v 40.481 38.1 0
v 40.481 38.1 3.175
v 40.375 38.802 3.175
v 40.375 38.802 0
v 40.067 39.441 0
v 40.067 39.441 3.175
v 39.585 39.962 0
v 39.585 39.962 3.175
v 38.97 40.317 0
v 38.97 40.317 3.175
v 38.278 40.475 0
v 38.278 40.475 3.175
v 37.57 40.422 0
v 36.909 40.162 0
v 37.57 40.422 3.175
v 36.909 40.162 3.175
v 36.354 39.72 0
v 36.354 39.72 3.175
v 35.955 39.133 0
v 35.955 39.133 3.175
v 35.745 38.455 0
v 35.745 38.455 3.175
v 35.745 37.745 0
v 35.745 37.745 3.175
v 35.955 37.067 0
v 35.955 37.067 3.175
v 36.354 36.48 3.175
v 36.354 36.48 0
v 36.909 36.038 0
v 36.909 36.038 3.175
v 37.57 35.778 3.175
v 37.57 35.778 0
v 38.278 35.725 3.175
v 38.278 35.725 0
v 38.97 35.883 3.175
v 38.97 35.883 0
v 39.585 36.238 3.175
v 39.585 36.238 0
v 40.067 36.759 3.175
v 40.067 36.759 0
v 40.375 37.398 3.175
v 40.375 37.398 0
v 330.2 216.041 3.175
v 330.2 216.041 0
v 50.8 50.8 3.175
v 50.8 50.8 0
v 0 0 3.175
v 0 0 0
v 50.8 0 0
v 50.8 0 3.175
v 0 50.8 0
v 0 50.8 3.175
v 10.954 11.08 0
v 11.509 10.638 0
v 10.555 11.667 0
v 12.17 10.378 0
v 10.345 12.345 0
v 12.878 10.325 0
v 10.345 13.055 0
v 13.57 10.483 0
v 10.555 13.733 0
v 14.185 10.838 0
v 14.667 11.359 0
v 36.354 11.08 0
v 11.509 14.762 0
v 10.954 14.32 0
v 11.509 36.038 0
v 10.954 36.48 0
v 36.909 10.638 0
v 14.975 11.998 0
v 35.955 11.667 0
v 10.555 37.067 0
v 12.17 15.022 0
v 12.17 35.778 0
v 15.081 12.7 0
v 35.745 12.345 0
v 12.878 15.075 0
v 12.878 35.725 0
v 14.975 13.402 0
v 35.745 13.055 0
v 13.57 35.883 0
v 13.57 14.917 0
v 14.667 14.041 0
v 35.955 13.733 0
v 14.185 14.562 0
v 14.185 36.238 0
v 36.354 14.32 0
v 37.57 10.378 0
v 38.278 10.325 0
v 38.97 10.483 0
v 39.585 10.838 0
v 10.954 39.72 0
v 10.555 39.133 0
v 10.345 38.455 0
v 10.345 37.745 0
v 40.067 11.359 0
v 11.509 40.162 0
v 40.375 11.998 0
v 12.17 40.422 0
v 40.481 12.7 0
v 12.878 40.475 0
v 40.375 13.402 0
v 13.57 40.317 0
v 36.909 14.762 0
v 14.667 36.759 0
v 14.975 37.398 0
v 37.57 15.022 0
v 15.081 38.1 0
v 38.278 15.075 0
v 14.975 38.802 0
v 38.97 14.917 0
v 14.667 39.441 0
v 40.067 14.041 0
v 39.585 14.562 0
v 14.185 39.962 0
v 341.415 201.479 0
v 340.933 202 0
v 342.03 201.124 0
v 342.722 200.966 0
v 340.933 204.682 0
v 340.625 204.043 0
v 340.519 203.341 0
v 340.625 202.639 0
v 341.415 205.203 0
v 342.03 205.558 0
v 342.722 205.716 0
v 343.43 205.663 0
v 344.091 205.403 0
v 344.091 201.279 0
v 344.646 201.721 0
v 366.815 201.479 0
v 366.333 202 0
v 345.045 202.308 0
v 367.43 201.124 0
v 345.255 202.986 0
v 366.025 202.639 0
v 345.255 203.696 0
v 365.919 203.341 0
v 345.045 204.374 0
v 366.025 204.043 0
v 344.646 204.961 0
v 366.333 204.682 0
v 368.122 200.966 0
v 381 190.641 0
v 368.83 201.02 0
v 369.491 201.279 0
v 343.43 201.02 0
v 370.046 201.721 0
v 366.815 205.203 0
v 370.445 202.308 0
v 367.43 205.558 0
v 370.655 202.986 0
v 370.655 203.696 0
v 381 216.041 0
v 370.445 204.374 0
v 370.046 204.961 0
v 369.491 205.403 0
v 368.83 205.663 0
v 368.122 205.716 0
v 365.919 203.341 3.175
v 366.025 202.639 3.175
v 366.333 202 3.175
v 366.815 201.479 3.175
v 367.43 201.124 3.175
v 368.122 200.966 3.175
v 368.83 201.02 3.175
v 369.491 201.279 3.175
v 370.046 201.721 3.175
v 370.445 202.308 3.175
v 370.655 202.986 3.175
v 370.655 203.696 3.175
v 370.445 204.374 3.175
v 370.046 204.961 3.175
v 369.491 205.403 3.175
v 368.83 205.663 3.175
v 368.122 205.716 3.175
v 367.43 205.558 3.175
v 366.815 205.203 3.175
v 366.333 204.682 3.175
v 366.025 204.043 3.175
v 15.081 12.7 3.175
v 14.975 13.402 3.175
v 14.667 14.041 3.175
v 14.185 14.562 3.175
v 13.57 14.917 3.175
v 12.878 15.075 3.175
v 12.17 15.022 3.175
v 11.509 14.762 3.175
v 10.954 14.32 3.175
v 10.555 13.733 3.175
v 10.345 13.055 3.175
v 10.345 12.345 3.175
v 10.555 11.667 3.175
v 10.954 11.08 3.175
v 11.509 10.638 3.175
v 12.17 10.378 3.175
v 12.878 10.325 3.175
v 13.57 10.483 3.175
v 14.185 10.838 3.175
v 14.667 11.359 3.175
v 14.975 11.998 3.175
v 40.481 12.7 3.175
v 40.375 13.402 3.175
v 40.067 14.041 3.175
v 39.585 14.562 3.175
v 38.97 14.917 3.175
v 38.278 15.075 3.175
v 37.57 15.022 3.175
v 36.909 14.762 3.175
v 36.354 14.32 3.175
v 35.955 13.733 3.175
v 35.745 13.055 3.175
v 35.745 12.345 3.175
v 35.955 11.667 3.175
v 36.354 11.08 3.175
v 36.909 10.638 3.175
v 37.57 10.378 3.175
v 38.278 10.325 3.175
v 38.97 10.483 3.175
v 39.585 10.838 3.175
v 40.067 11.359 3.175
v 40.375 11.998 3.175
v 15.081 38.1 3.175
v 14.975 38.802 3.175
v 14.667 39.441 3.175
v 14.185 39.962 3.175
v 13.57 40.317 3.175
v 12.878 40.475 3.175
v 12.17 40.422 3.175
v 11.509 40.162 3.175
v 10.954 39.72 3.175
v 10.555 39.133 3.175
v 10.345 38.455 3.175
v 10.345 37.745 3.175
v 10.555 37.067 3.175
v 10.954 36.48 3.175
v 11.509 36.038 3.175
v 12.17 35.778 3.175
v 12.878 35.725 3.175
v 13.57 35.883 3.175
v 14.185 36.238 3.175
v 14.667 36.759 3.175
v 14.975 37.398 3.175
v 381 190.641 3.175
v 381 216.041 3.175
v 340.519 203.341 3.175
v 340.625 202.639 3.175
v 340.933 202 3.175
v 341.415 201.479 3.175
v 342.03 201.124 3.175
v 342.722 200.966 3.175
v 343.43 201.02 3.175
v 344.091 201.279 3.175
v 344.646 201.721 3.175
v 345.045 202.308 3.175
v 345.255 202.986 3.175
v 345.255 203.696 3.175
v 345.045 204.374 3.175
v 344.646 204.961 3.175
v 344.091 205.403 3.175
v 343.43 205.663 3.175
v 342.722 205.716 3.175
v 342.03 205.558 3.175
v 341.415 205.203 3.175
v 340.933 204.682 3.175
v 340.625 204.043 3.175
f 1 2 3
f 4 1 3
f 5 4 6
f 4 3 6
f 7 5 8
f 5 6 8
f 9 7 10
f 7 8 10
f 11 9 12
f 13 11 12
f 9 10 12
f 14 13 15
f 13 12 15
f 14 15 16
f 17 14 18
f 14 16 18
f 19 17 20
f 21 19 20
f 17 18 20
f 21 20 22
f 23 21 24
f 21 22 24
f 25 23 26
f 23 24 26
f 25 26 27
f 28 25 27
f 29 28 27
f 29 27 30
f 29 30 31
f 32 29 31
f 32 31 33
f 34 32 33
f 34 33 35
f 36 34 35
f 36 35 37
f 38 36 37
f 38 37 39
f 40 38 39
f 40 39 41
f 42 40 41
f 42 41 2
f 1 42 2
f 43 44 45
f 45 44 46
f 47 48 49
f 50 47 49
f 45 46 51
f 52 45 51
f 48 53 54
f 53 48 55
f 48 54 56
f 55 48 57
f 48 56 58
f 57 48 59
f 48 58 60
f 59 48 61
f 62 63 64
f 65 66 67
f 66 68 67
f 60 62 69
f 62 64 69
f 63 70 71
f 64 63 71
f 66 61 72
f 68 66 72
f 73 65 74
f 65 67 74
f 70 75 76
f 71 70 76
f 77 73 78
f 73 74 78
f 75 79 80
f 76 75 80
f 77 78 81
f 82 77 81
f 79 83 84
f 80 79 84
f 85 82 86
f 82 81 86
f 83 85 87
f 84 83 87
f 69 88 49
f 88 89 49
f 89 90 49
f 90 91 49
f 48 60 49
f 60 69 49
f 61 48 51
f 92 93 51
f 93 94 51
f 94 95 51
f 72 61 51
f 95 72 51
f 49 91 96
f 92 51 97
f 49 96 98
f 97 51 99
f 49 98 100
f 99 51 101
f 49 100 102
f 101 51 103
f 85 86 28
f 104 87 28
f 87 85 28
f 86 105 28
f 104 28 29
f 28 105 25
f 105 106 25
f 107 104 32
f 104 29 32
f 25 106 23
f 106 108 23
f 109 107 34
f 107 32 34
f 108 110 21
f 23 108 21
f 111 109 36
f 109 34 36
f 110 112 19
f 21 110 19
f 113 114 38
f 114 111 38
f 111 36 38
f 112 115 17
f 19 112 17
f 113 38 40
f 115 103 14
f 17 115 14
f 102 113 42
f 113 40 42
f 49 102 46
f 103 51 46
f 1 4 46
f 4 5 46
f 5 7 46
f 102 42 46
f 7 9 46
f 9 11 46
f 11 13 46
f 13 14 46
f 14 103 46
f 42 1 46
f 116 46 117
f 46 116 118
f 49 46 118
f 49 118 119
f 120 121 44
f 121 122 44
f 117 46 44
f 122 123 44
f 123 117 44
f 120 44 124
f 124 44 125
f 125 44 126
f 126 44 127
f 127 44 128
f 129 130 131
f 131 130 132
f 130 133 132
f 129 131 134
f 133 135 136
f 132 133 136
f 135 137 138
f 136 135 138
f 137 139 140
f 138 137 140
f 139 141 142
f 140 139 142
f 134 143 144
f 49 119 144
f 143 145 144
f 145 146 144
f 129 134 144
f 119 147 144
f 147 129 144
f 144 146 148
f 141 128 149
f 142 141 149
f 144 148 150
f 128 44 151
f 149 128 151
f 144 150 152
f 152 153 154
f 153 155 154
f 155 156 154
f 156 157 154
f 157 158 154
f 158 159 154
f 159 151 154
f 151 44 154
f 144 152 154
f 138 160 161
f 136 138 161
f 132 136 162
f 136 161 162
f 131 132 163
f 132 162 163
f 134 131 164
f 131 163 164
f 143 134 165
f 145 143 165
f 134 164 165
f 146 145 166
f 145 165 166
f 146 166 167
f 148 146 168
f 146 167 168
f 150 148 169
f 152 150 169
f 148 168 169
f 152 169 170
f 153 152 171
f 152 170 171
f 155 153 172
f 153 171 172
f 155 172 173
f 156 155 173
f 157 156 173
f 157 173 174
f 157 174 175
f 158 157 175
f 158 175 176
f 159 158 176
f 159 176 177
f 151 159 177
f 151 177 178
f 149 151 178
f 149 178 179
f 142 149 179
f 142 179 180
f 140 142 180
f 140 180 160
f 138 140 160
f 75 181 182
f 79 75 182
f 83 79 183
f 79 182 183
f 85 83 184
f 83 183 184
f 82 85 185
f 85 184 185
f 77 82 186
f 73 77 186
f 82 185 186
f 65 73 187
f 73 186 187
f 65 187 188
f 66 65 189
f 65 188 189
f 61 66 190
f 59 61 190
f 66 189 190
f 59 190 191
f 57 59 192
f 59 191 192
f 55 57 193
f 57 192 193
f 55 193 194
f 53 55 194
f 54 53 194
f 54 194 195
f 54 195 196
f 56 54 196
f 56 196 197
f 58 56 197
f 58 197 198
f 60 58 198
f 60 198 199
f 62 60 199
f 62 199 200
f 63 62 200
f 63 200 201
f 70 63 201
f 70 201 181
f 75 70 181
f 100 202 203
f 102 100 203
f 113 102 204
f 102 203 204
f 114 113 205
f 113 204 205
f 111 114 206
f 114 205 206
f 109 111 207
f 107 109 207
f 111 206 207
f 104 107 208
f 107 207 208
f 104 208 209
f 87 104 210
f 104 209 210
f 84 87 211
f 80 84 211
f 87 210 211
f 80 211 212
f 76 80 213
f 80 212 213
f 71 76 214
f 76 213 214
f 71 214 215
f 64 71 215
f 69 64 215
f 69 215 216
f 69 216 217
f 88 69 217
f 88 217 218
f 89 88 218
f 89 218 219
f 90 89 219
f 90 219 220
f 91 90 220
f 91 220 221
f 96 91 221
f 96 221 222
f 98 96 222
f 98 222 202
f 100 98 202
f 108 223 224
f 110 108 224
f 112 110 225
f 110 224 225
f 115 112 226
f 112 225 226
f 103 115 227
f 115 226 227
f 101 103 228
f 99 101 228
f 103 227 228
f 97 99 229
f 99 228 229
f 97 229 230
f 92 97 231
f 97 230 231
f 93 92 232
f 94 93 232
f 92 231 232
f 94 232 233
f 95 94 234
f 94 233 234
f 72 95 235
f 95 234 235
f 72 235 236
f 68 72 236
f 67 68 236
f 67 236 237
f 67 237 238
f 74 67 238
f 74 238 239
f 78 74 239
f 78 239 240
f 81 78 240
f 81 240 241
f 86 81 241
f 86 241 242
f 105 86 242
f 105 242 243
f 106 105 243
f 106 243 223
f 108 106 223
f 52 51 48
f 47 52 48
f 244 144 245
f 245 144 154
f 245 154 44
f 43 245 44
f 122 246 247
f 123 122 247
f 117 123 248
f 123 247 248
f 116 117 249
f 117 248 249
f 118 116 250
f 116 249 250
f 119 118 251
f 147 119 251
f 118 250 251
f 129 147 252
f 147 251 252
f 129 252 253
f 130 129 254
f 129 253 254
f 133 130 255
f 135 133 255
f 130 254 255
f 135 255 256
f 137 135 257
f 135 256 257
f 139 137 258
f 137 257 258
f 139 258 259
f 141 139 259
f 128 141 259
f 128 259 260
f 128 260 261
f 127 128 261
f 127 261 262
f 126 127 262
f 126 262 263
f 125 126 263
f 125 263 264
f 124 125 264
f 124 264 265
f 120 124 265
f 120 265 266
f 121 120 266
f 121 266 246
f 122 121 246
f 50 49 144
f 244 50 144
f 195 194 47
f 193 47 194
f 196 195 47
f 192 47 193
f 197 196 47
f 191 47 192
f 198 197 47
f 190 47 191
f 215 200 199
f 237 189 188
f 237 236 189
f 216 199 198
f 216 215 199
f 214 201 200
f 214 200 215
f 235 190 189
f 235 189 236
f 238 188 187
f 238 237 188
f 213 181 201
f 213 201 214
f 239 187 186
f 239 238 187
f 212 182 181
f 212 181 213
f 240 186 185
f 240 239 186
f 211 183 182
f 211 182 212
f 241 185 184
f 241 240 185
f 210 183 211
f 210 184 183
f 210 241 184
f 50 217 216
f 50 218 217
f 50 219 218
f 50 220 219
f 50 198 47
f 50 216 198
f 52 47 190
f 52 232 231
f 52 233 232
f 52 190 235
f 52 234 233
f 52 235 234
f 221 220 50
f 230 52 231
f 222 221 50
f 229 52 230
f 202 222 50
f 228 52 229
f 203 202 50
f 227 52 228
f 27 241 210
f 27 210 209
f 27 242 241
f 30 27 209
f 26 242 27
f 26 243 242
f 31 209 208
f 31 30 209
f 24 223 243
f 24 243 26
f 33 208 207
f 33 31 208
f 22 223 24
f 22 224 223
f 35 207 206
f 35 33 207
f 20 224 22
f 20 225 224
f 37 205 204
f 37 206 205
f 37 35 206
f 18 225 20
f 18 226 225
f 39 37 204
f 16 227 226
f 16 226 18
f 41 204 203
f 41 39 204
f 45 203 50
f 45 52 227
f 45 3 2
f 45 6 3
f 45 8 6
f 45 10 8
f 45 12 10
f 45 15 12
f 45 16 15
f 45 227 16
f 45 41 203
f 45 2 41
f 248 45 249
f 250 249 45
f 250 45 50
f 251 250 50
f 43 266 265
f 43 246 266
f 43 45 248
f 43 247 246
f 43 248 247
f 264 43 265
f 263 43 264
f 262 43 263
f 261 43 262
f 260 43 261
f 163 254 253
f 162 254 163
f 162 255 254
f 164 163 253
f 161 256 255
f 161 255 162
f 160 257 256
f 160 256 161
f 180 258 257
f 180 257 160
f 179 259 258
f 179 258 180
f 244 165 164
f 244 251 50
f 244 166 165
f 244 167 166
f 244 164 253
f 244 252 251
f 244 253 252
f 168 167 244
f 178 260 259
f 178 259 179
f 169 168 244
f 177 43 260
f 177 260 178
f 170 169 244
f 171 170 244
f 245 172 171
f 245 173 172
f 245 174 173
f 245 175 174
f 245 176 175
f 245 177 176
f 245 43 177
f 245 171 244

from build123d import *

# Parameters (mm, degrees)
BOSS_EXTRUDE1_DEPTH = 3.175
SKETCH3_R           = 2.38125
CUT_EXTRUDE1_DEPTH  = 439.000935786


with BuildPart() as part:
    # Sketch2 → Boss-Extrude1 (new body)
    with BuildSketch(Plane.XY):
        Polygon((50.8, 0), (381, 190.641058886), (381, 216.041058886), (330.2, 216.041058886), (50.8, 50.8), (0, 50.8), (0, 0), align=None)
    extrude(amount=BOSS_EXTRUDE1_DEPTH)

    # Sketch3 → Cut-Extrude1 (cut, through all)
    with BuildSketch(Plane.XY.offset(3.175)):
        with Locations((12.7, 12.7)):
            Circle(SKETCH3_R)
        with Locations((12.7, 38.1)):
            Circle(SKETCH3_R)
        with Locations(Location((342.9, 203.341058886, 0), (0, 0, 180))):
            Circle(SKETCH3_R)
        with Locations(Location((368.3, 203.341058886, 0), (0, 0, 180))):
            Circle(SKETCH3_R)
        with Locations((38.1, 12.7)):
            Circle(SKETCH3_R)
        with Locations((38.1, 38.1)):
            Circle(SKETCH3_R)
    extrude(amount=-CUT_EXTRUDE1_DEPTH, mode=Mode.SUBTRACT)


solid = part.part
